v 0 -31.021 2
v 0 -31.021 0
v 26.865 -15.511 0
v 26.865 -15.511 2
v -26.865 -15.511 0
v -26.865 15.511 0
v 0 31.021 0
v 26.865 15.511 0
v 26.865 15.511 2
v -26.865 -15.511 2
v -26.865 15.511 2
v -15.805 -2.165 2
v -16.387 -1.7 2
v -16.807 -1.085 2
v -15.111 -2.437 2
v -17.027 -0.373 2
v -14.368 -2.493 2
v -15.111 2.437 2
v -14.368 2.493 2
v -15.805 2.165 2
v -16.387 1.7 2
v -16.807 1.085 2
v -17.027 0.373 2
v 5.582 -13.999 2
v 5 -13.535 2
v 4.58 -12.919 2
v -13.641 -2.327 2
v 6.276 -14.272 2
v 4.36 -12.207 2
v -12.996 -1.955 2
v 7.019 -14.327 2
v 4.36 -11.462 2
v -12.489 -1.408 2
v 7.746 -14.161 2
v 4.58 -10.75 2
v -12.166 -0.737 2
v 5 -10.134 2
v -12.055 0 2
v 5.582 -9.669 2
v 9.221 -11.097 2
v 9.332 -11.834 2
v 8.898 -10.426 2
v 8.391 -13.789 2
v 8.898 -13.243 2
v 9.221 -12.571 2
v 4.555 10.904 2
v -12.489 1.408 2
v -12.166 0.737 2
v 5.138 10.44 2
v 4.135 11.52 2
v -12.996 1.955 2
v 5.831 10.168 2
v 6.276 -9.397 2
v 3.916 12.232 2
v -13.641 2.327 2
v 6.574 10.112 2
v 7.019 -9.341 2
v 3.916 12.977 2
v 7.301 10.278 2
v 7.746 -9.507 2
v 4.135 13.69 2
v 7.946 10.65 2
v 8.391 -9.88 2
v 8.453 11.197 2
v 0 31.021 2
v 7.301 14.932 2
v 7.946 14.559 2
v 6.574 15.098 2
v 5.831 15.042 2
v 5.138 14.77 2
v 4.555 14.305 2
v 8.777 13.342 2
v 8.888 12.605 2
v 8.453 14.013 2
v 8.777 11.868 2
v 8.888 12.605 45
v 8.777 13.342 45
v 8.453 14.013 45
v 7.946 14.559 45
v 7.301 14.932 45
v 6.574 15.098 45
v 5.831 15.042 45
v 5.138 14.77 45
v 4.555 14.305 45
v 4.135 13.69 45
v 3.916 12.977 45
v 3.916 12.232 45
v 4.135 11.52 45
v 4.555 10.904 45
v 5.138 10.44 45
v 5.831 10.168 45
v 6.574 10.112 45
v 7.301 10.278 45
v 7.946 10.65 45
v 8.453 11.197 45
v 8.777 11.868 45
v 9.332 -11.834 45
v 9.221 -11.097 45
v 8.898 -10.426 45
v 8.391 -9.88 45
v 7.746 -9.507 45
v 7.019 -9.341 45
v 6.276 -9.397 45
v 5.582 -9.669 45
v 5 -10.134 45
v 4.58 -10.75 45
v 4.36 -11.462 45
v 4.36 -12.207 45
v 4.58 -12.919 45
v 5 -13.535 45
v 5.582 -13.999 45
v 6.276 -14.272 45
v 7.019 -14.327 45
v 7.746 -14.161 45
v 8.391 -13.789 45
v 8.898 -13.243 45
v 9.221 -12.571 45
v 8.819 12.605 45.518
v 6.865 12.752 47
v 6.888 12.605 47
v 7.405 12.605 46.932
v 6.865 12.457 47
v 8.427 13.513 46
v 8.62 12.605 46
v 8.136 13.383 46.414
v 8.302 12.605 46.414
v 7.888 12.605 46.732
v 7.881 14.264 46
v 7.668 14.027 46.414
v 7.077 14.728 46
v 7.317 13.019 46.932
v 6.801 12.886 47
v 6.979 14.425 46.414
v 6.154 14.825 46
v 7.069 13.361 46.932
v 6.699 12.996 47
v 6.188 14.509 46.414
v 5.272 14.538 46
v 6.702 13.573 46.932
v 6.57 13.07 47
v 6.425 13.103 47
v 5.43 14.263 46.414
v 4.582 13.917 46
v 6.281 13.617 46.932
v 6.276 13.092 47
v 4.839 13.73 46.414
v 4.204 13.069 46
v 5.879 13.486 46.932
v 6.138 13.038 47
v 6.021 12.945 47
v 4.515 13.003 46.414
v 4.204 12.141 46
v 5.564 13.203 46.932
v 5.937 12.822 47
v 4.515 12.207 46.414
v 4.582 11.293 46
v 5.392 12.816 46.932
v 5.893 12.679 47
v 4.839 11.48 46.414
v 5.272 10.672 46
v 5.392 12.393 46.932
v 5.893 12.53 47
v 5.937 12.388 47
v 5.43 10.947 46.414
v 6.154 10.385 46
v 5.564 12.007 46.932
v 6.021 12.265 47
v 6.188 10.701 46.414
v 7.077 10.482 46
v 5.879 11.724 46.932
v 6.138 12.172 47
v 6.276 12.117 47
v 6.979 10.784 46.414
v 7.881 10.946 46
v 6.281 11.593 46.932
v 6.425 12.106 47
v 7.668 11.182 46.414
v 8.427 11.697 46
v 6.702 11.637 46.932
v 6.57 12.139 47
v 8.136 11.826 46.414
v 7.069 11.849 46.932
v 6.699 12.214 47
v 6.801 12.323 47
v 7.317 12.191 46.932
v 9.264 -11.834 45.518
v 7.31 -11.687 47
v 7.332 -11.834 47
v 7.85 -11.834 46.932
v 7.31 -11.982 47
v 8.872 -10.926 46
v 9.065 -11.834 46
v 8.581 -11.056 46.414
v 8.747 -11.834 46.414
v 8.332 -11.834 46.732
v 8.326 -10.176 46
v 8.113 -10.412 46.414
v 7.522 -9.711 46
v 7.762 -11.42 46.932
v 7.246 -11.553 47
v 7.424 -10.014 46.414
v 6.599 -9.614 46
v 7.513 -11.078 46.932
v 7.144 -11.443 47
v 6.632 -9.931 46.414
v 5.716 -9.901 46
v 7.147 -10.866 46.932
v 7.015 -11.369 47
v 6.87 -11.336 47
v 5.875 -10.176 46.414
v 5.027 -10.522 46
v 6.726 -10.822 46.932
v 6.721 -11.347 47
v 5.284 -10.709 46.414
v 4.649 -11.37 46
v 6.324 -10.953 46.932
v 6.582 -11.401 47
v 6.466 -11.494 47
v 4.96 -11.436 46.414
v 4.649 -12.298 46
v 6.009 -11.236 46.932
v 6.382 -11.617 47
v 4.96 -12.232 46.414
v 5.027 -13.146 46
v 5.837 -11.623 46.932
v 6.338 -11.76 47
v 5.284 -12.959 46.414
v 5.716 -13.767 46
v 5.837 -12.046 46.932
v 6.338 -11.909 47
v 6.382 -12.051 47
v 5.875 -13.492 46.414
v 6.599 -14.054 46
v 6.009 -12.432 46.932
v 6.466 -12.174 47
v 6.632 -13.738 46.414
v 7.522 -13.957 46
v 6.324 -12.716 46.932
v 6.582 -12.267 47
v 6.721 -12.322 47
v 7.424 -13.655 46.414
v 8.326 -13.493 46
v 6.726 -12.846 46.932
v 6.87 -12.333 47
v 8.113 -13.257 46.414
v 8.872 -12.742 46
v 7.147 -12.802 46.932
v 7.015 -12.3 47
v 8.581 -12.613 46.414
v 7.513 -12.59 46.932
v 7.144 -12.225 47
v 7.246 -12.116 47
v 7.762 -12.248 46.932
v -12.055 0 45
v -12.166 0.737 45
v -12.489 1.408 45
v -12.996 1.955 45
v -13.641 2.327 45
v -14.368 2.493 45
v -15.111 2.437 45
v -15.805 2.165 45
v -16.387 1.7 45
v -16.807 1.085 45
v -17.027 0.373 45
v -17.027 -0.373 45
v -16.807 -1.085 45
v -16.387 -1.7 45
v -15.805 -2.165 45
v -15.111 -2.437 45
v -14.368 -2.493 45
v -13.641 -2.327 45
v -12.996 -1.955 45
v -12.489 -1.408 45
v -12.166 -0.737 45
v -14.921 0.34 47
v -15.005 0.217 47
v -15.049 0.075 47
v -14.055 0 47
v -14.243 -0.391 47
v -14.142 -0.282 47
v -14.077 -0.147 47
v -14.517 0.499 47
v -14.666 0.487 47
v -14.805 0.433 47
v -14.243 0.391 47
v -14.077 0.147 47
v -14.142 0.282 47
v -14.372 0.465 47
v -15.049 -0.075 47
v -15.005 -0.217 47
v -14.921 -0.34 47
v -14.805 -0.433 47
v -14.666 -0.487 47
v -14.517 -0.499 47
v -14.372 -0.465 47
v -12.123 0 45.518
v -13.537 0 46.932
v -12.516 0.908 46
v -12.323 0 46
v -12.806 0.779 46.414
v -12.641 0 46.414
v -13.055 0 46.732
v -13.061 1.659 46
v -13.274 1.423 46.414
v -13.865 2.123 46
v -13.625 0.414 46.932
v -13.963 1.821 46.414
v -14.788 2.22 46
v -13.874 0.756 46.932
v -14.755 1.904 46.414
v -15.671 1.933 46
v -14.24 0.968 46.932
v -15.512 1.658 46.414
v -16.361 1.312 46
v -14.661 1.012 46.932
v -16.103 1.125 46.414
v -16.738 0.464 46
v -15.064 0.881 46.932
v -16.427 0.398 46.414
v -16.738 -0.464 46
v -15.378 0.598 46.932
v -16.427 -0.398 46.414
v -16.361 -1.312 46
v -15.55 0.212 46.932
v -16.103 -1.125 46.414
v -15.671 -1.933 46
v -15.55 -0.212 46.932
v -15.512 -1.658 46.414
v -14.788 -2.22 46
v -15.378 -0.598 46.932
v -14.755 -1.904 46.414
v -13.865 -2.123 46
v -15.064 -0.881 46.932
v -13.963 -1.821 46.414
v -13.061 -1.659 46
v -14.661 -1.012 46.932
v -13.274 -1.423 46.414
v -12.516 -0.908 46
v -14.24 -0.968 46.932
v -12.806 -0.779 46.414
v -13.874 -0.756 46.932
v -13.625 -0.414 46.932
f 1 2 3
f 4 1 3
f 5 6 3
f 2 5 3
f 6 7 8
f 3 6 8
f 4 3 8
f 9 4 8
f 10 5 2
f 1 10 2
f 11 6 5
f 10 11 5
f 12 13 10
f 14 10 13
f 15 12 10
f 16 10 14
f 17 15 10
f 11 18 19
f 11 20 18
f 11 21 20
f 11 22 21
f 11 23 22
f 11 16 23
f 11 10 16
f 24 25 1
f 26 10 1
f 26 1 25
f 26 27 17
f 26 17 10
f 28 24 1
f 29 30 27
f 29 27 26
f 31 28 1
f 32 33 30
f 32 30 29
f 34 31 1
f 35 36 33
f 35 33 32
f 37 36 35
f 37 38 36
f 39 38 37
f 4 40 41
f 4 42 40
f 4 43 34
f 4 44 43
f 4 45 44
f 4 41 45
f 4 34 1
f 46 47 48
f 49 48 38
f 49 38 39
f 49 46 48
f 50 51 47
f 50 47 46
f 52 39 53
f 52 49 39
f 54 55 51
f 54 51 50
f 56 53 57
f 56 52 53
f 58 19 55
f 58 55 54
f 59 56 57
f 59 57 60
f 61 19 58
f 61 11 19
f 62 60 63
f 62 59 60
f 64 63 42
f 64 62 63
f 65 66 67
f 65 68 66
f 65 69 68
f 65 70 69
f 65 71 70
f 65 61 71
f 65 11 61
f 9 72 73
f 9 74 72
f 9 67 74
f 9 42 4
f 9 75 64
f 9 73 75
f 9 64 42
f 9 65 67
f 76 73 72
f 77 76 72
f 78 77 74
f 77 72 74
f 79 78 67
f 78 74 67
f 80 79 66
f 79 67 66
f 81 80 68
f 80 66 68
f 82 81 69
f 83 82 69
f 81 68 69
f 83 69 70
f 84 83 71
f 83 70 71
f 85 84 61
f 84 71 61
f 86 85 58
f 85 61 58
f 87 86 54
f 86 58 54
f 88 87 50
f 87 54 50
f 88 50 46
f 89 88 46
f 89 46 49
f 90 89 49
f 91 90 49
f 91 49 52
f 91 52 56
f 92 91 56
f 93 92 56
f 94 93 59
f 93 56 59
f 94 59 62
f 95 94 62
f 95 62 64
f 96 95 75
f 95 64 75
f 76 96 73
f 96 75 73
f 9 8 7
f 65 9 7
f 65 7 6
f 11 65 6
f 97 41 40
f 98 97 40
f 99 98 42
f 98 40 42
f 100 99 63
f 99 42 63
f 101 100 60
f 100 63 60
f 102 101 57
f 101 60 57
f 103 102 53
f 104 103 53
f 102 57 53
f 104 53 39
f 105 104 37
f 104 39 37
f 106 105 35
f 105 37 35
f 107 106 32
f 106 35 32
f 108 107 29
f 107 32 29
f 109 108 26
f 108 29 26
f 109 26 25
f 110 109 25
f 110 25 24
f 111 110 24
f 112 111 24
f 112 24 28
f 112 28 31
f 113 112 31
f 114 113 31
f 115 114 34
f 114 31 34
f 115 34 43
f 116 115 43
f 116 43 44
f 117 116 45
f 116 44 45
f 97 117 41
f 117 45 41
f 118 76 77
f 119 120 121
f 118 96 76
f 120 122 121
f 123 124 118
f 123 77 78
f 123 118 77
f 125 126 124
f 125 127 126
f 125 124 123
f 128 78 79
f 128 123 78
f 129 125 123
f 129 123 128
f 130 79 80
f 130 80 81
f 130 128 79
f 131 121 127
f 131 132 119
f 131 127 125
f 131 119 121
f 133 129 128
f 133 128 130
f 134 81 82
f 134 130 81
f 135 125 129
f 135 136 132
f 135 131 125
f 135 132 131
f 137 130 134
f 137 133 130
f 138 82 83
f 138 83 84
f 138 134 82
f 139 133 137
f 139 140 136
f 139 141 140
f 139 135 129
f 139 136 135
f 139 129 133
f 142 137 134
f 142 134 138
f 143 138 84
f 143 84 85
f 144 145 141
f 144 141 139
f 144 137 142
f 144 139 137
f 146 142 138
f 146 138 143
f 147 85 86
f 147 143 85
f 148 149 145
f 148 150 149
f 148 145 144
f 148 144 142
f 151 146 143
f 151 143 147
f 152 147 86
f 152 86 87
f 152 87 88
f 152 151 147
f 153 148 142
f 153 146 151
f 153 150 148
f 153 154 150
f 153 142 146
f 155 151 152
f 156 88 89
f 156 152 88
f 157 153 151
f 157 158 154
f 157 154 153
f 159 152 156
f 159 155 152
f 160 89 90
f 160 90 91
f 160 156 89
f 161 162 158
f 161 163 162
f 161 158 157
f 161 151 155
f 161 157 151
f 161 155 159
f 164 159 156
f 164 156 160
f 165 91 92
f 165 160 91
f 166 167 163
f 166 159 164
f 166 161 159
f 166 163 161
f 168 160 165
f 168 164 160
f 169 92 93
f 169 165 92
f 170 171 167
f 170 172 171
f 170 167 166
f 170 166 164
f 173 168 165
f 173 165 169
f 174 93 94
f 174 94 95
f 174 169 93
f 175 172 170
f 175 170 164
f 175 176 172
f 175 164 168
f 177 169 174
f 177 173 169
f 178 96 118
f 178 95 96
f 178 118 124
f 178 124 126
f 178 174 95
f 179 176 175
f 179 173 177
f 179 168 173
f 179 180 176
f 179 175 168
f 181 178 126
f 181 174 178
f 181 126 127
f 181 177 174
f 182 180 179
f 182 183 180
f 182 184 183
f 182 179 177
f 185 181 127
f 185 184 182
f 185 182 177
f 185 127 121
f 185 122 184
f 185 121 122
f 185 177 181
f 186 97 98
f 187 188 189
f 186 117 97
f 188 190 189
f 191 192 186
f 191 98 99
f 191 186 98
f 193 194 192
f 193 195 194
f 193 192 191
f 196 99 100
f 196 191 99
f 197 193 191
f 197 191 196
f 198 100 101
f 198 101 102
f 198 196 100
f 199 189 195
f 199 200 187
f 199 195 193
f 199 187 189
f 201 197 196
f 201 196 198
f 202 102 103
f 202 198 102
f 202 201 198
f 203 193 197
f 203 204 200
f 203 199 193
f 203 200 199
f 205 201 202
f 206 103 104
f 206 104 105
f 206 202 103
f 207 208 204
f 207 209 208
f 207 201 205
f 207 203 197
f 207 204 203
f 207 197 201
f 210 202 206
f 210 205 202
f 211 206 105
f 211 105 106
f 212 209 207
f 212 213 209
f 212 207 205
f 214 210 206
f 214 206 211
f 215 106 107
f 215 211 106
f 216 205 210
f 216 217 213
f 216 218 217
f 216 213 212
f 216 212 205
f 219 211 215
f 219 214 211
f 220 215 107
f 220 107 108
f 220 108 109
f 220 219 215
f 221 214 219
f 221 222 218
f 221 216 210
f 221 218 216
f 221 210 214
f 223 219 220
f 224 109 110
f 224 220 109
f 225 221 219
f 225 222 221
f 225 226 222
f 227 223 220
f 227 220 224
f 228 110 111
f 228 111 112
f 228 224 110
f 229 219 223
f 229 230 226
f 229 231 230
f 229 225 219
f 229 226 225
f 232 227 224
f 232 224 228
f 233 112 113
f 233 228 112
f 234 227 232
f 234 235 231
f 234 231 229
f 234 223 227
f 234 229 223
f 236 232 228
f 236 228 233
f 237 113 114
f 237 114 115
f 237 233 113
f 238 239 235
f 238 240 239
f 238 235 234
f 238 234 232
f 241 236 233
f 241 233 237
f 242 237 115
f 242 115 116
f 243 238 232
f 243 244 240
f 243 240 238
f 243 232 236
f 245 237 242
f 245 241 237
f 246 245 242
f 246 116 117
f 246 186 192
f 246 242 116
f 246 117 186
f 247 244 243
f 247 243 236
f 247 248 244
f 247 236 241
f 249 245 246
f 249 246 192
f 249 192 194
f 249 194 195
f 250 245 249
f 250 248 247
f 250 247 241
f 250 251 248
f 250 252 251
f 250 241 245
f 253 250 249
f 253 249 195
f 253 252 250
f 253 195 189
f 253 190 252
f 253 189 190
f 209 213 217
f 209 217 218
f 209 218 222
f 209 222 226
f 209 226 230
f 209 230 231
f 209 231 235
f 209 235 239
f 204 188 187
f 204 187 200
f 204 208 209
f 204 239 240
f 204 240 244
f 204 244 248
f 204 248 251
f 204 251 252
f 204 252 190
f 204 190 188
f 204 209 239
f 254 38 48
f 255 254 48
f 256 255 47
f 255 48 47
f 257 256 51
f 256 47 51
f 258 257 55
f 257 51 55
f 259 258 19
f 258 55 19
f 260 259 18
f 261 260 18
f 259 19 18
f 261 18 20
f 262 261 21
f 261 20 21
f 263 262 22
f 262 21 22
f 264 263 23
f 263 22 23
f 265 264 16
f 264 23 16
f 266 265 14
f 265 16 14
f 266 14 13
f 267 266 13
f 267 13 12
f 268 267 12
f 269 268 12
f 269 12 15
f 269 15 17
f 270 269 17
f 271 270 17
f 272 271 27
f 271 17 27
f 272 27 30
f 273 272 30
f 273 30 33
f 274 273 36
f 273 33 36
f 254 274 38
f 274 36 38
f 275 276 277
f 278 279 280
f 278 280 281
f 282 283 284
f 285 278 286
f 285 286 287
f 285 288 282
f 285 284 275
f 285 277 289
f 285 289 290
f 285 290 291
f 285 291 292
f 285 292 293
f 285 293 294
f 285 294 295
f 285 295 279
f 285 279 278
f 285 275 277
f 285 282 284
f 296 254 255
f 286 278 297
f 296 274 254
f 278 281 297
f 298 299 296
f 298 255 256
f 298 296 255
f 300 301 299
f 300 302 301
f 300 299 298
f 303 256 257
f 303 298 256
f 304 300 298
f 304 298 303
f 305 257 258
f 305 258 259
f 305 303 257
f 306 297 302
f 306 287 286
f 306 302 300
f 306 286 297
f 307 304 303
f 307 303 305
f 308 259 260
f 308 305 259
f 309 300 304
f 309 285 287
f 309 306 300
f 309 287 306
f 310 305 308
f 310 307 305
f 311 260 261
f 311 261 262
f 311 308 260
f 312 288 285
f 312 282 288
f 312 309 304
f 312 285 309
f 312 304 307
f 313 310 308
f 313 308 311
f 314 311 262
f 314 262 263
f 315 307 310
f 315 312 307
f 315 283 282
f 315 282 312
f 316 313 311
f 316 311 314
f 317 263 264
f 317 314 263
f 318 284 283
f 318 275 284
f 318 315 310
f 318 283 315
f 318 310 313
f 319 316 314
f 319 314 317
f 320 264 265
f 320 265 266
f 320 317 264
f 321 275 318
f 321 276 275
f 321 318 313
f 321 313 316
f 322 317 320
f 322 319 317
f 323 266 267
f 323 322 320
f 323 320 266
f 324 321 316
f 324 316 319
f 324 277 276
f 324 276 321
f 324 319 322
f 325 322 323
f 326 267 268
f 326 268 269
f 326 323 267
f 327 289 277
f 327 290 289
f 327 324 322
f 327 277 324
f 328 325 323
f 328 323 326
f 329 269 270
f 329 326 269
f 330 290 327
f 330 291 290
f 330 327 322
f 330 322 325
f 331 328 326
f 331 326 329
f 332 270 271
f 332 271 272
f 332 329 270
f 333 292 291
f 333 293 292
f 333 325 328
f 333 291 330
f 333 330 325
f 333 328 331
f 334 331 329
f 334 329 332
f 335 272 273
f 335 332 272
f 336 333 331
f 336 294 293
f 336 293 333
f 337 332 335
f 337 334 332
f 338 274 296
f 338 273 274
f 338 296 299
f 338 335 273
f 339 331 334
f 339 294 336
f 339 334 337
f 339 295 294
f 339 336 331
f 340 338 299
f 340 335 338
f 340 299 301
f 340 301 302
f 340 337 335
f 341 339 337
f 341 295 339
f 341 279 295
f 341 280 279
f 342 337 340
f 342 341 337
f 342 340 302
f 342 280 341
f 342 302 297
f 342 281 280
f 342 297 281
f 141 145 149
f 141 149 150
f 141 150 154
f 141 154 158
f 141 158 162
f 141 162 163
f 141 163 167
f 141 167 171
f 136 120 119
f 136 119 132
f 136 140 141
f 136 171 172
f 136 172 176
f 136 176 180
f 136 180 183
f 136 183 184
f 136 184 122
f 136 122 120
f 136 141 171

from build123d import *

# Parameters (mm, degrees)
F0_R     = 22.365
F1_DEPTH = 2
F2_R     = 2.5
F3_DEPTH = 45
F4_R     = 2


# Not quite as in the source:
# - a feature of the source that left no trace in its solid (it failed there, or was rolled back) is left out


with BuildPart() as f1:
    # F0 (on Top) → F1 (new body)
    with BuildSketch(Plane.XY):
        Polygon((26.865, -15.5105149818), (26.865, 15.5105149818), (0, 31.0210299636), (-26.865, 15.5105149818), (-26.865, -15.5105149818), (0, -31.0210299636), align=None)
        Circle(F0_R, mode=Mode.SUBTRACT)
        Circle(F0_R)
    extrude(amount=F1_DEPTH)

    # F2 (on face) → F3 (join)
    with BuildSketch(Plane.XY.offset(2)):
        with Locations((-14.5547939909, 0)):
            Circle(F2_R)
        with Locations((6.3876030045, 12.604821343)):
            Circle(F2_R)
        with Locations((6.8325, -11.8342371427)):
            Circle(F2_R)
    extrude(amount=F3_DEPTH)

    # F4
    f4_edges = [f1.edges().sort_by_distance(p)[0] for p in [
        (-17.054794, 0, 47),
        (4.3325, -11.834237, 47),
        (3.887603, 12.604821, 47),
    ]]
    fillet(f4_edges, radius=F4_R)


solid = f1.part
